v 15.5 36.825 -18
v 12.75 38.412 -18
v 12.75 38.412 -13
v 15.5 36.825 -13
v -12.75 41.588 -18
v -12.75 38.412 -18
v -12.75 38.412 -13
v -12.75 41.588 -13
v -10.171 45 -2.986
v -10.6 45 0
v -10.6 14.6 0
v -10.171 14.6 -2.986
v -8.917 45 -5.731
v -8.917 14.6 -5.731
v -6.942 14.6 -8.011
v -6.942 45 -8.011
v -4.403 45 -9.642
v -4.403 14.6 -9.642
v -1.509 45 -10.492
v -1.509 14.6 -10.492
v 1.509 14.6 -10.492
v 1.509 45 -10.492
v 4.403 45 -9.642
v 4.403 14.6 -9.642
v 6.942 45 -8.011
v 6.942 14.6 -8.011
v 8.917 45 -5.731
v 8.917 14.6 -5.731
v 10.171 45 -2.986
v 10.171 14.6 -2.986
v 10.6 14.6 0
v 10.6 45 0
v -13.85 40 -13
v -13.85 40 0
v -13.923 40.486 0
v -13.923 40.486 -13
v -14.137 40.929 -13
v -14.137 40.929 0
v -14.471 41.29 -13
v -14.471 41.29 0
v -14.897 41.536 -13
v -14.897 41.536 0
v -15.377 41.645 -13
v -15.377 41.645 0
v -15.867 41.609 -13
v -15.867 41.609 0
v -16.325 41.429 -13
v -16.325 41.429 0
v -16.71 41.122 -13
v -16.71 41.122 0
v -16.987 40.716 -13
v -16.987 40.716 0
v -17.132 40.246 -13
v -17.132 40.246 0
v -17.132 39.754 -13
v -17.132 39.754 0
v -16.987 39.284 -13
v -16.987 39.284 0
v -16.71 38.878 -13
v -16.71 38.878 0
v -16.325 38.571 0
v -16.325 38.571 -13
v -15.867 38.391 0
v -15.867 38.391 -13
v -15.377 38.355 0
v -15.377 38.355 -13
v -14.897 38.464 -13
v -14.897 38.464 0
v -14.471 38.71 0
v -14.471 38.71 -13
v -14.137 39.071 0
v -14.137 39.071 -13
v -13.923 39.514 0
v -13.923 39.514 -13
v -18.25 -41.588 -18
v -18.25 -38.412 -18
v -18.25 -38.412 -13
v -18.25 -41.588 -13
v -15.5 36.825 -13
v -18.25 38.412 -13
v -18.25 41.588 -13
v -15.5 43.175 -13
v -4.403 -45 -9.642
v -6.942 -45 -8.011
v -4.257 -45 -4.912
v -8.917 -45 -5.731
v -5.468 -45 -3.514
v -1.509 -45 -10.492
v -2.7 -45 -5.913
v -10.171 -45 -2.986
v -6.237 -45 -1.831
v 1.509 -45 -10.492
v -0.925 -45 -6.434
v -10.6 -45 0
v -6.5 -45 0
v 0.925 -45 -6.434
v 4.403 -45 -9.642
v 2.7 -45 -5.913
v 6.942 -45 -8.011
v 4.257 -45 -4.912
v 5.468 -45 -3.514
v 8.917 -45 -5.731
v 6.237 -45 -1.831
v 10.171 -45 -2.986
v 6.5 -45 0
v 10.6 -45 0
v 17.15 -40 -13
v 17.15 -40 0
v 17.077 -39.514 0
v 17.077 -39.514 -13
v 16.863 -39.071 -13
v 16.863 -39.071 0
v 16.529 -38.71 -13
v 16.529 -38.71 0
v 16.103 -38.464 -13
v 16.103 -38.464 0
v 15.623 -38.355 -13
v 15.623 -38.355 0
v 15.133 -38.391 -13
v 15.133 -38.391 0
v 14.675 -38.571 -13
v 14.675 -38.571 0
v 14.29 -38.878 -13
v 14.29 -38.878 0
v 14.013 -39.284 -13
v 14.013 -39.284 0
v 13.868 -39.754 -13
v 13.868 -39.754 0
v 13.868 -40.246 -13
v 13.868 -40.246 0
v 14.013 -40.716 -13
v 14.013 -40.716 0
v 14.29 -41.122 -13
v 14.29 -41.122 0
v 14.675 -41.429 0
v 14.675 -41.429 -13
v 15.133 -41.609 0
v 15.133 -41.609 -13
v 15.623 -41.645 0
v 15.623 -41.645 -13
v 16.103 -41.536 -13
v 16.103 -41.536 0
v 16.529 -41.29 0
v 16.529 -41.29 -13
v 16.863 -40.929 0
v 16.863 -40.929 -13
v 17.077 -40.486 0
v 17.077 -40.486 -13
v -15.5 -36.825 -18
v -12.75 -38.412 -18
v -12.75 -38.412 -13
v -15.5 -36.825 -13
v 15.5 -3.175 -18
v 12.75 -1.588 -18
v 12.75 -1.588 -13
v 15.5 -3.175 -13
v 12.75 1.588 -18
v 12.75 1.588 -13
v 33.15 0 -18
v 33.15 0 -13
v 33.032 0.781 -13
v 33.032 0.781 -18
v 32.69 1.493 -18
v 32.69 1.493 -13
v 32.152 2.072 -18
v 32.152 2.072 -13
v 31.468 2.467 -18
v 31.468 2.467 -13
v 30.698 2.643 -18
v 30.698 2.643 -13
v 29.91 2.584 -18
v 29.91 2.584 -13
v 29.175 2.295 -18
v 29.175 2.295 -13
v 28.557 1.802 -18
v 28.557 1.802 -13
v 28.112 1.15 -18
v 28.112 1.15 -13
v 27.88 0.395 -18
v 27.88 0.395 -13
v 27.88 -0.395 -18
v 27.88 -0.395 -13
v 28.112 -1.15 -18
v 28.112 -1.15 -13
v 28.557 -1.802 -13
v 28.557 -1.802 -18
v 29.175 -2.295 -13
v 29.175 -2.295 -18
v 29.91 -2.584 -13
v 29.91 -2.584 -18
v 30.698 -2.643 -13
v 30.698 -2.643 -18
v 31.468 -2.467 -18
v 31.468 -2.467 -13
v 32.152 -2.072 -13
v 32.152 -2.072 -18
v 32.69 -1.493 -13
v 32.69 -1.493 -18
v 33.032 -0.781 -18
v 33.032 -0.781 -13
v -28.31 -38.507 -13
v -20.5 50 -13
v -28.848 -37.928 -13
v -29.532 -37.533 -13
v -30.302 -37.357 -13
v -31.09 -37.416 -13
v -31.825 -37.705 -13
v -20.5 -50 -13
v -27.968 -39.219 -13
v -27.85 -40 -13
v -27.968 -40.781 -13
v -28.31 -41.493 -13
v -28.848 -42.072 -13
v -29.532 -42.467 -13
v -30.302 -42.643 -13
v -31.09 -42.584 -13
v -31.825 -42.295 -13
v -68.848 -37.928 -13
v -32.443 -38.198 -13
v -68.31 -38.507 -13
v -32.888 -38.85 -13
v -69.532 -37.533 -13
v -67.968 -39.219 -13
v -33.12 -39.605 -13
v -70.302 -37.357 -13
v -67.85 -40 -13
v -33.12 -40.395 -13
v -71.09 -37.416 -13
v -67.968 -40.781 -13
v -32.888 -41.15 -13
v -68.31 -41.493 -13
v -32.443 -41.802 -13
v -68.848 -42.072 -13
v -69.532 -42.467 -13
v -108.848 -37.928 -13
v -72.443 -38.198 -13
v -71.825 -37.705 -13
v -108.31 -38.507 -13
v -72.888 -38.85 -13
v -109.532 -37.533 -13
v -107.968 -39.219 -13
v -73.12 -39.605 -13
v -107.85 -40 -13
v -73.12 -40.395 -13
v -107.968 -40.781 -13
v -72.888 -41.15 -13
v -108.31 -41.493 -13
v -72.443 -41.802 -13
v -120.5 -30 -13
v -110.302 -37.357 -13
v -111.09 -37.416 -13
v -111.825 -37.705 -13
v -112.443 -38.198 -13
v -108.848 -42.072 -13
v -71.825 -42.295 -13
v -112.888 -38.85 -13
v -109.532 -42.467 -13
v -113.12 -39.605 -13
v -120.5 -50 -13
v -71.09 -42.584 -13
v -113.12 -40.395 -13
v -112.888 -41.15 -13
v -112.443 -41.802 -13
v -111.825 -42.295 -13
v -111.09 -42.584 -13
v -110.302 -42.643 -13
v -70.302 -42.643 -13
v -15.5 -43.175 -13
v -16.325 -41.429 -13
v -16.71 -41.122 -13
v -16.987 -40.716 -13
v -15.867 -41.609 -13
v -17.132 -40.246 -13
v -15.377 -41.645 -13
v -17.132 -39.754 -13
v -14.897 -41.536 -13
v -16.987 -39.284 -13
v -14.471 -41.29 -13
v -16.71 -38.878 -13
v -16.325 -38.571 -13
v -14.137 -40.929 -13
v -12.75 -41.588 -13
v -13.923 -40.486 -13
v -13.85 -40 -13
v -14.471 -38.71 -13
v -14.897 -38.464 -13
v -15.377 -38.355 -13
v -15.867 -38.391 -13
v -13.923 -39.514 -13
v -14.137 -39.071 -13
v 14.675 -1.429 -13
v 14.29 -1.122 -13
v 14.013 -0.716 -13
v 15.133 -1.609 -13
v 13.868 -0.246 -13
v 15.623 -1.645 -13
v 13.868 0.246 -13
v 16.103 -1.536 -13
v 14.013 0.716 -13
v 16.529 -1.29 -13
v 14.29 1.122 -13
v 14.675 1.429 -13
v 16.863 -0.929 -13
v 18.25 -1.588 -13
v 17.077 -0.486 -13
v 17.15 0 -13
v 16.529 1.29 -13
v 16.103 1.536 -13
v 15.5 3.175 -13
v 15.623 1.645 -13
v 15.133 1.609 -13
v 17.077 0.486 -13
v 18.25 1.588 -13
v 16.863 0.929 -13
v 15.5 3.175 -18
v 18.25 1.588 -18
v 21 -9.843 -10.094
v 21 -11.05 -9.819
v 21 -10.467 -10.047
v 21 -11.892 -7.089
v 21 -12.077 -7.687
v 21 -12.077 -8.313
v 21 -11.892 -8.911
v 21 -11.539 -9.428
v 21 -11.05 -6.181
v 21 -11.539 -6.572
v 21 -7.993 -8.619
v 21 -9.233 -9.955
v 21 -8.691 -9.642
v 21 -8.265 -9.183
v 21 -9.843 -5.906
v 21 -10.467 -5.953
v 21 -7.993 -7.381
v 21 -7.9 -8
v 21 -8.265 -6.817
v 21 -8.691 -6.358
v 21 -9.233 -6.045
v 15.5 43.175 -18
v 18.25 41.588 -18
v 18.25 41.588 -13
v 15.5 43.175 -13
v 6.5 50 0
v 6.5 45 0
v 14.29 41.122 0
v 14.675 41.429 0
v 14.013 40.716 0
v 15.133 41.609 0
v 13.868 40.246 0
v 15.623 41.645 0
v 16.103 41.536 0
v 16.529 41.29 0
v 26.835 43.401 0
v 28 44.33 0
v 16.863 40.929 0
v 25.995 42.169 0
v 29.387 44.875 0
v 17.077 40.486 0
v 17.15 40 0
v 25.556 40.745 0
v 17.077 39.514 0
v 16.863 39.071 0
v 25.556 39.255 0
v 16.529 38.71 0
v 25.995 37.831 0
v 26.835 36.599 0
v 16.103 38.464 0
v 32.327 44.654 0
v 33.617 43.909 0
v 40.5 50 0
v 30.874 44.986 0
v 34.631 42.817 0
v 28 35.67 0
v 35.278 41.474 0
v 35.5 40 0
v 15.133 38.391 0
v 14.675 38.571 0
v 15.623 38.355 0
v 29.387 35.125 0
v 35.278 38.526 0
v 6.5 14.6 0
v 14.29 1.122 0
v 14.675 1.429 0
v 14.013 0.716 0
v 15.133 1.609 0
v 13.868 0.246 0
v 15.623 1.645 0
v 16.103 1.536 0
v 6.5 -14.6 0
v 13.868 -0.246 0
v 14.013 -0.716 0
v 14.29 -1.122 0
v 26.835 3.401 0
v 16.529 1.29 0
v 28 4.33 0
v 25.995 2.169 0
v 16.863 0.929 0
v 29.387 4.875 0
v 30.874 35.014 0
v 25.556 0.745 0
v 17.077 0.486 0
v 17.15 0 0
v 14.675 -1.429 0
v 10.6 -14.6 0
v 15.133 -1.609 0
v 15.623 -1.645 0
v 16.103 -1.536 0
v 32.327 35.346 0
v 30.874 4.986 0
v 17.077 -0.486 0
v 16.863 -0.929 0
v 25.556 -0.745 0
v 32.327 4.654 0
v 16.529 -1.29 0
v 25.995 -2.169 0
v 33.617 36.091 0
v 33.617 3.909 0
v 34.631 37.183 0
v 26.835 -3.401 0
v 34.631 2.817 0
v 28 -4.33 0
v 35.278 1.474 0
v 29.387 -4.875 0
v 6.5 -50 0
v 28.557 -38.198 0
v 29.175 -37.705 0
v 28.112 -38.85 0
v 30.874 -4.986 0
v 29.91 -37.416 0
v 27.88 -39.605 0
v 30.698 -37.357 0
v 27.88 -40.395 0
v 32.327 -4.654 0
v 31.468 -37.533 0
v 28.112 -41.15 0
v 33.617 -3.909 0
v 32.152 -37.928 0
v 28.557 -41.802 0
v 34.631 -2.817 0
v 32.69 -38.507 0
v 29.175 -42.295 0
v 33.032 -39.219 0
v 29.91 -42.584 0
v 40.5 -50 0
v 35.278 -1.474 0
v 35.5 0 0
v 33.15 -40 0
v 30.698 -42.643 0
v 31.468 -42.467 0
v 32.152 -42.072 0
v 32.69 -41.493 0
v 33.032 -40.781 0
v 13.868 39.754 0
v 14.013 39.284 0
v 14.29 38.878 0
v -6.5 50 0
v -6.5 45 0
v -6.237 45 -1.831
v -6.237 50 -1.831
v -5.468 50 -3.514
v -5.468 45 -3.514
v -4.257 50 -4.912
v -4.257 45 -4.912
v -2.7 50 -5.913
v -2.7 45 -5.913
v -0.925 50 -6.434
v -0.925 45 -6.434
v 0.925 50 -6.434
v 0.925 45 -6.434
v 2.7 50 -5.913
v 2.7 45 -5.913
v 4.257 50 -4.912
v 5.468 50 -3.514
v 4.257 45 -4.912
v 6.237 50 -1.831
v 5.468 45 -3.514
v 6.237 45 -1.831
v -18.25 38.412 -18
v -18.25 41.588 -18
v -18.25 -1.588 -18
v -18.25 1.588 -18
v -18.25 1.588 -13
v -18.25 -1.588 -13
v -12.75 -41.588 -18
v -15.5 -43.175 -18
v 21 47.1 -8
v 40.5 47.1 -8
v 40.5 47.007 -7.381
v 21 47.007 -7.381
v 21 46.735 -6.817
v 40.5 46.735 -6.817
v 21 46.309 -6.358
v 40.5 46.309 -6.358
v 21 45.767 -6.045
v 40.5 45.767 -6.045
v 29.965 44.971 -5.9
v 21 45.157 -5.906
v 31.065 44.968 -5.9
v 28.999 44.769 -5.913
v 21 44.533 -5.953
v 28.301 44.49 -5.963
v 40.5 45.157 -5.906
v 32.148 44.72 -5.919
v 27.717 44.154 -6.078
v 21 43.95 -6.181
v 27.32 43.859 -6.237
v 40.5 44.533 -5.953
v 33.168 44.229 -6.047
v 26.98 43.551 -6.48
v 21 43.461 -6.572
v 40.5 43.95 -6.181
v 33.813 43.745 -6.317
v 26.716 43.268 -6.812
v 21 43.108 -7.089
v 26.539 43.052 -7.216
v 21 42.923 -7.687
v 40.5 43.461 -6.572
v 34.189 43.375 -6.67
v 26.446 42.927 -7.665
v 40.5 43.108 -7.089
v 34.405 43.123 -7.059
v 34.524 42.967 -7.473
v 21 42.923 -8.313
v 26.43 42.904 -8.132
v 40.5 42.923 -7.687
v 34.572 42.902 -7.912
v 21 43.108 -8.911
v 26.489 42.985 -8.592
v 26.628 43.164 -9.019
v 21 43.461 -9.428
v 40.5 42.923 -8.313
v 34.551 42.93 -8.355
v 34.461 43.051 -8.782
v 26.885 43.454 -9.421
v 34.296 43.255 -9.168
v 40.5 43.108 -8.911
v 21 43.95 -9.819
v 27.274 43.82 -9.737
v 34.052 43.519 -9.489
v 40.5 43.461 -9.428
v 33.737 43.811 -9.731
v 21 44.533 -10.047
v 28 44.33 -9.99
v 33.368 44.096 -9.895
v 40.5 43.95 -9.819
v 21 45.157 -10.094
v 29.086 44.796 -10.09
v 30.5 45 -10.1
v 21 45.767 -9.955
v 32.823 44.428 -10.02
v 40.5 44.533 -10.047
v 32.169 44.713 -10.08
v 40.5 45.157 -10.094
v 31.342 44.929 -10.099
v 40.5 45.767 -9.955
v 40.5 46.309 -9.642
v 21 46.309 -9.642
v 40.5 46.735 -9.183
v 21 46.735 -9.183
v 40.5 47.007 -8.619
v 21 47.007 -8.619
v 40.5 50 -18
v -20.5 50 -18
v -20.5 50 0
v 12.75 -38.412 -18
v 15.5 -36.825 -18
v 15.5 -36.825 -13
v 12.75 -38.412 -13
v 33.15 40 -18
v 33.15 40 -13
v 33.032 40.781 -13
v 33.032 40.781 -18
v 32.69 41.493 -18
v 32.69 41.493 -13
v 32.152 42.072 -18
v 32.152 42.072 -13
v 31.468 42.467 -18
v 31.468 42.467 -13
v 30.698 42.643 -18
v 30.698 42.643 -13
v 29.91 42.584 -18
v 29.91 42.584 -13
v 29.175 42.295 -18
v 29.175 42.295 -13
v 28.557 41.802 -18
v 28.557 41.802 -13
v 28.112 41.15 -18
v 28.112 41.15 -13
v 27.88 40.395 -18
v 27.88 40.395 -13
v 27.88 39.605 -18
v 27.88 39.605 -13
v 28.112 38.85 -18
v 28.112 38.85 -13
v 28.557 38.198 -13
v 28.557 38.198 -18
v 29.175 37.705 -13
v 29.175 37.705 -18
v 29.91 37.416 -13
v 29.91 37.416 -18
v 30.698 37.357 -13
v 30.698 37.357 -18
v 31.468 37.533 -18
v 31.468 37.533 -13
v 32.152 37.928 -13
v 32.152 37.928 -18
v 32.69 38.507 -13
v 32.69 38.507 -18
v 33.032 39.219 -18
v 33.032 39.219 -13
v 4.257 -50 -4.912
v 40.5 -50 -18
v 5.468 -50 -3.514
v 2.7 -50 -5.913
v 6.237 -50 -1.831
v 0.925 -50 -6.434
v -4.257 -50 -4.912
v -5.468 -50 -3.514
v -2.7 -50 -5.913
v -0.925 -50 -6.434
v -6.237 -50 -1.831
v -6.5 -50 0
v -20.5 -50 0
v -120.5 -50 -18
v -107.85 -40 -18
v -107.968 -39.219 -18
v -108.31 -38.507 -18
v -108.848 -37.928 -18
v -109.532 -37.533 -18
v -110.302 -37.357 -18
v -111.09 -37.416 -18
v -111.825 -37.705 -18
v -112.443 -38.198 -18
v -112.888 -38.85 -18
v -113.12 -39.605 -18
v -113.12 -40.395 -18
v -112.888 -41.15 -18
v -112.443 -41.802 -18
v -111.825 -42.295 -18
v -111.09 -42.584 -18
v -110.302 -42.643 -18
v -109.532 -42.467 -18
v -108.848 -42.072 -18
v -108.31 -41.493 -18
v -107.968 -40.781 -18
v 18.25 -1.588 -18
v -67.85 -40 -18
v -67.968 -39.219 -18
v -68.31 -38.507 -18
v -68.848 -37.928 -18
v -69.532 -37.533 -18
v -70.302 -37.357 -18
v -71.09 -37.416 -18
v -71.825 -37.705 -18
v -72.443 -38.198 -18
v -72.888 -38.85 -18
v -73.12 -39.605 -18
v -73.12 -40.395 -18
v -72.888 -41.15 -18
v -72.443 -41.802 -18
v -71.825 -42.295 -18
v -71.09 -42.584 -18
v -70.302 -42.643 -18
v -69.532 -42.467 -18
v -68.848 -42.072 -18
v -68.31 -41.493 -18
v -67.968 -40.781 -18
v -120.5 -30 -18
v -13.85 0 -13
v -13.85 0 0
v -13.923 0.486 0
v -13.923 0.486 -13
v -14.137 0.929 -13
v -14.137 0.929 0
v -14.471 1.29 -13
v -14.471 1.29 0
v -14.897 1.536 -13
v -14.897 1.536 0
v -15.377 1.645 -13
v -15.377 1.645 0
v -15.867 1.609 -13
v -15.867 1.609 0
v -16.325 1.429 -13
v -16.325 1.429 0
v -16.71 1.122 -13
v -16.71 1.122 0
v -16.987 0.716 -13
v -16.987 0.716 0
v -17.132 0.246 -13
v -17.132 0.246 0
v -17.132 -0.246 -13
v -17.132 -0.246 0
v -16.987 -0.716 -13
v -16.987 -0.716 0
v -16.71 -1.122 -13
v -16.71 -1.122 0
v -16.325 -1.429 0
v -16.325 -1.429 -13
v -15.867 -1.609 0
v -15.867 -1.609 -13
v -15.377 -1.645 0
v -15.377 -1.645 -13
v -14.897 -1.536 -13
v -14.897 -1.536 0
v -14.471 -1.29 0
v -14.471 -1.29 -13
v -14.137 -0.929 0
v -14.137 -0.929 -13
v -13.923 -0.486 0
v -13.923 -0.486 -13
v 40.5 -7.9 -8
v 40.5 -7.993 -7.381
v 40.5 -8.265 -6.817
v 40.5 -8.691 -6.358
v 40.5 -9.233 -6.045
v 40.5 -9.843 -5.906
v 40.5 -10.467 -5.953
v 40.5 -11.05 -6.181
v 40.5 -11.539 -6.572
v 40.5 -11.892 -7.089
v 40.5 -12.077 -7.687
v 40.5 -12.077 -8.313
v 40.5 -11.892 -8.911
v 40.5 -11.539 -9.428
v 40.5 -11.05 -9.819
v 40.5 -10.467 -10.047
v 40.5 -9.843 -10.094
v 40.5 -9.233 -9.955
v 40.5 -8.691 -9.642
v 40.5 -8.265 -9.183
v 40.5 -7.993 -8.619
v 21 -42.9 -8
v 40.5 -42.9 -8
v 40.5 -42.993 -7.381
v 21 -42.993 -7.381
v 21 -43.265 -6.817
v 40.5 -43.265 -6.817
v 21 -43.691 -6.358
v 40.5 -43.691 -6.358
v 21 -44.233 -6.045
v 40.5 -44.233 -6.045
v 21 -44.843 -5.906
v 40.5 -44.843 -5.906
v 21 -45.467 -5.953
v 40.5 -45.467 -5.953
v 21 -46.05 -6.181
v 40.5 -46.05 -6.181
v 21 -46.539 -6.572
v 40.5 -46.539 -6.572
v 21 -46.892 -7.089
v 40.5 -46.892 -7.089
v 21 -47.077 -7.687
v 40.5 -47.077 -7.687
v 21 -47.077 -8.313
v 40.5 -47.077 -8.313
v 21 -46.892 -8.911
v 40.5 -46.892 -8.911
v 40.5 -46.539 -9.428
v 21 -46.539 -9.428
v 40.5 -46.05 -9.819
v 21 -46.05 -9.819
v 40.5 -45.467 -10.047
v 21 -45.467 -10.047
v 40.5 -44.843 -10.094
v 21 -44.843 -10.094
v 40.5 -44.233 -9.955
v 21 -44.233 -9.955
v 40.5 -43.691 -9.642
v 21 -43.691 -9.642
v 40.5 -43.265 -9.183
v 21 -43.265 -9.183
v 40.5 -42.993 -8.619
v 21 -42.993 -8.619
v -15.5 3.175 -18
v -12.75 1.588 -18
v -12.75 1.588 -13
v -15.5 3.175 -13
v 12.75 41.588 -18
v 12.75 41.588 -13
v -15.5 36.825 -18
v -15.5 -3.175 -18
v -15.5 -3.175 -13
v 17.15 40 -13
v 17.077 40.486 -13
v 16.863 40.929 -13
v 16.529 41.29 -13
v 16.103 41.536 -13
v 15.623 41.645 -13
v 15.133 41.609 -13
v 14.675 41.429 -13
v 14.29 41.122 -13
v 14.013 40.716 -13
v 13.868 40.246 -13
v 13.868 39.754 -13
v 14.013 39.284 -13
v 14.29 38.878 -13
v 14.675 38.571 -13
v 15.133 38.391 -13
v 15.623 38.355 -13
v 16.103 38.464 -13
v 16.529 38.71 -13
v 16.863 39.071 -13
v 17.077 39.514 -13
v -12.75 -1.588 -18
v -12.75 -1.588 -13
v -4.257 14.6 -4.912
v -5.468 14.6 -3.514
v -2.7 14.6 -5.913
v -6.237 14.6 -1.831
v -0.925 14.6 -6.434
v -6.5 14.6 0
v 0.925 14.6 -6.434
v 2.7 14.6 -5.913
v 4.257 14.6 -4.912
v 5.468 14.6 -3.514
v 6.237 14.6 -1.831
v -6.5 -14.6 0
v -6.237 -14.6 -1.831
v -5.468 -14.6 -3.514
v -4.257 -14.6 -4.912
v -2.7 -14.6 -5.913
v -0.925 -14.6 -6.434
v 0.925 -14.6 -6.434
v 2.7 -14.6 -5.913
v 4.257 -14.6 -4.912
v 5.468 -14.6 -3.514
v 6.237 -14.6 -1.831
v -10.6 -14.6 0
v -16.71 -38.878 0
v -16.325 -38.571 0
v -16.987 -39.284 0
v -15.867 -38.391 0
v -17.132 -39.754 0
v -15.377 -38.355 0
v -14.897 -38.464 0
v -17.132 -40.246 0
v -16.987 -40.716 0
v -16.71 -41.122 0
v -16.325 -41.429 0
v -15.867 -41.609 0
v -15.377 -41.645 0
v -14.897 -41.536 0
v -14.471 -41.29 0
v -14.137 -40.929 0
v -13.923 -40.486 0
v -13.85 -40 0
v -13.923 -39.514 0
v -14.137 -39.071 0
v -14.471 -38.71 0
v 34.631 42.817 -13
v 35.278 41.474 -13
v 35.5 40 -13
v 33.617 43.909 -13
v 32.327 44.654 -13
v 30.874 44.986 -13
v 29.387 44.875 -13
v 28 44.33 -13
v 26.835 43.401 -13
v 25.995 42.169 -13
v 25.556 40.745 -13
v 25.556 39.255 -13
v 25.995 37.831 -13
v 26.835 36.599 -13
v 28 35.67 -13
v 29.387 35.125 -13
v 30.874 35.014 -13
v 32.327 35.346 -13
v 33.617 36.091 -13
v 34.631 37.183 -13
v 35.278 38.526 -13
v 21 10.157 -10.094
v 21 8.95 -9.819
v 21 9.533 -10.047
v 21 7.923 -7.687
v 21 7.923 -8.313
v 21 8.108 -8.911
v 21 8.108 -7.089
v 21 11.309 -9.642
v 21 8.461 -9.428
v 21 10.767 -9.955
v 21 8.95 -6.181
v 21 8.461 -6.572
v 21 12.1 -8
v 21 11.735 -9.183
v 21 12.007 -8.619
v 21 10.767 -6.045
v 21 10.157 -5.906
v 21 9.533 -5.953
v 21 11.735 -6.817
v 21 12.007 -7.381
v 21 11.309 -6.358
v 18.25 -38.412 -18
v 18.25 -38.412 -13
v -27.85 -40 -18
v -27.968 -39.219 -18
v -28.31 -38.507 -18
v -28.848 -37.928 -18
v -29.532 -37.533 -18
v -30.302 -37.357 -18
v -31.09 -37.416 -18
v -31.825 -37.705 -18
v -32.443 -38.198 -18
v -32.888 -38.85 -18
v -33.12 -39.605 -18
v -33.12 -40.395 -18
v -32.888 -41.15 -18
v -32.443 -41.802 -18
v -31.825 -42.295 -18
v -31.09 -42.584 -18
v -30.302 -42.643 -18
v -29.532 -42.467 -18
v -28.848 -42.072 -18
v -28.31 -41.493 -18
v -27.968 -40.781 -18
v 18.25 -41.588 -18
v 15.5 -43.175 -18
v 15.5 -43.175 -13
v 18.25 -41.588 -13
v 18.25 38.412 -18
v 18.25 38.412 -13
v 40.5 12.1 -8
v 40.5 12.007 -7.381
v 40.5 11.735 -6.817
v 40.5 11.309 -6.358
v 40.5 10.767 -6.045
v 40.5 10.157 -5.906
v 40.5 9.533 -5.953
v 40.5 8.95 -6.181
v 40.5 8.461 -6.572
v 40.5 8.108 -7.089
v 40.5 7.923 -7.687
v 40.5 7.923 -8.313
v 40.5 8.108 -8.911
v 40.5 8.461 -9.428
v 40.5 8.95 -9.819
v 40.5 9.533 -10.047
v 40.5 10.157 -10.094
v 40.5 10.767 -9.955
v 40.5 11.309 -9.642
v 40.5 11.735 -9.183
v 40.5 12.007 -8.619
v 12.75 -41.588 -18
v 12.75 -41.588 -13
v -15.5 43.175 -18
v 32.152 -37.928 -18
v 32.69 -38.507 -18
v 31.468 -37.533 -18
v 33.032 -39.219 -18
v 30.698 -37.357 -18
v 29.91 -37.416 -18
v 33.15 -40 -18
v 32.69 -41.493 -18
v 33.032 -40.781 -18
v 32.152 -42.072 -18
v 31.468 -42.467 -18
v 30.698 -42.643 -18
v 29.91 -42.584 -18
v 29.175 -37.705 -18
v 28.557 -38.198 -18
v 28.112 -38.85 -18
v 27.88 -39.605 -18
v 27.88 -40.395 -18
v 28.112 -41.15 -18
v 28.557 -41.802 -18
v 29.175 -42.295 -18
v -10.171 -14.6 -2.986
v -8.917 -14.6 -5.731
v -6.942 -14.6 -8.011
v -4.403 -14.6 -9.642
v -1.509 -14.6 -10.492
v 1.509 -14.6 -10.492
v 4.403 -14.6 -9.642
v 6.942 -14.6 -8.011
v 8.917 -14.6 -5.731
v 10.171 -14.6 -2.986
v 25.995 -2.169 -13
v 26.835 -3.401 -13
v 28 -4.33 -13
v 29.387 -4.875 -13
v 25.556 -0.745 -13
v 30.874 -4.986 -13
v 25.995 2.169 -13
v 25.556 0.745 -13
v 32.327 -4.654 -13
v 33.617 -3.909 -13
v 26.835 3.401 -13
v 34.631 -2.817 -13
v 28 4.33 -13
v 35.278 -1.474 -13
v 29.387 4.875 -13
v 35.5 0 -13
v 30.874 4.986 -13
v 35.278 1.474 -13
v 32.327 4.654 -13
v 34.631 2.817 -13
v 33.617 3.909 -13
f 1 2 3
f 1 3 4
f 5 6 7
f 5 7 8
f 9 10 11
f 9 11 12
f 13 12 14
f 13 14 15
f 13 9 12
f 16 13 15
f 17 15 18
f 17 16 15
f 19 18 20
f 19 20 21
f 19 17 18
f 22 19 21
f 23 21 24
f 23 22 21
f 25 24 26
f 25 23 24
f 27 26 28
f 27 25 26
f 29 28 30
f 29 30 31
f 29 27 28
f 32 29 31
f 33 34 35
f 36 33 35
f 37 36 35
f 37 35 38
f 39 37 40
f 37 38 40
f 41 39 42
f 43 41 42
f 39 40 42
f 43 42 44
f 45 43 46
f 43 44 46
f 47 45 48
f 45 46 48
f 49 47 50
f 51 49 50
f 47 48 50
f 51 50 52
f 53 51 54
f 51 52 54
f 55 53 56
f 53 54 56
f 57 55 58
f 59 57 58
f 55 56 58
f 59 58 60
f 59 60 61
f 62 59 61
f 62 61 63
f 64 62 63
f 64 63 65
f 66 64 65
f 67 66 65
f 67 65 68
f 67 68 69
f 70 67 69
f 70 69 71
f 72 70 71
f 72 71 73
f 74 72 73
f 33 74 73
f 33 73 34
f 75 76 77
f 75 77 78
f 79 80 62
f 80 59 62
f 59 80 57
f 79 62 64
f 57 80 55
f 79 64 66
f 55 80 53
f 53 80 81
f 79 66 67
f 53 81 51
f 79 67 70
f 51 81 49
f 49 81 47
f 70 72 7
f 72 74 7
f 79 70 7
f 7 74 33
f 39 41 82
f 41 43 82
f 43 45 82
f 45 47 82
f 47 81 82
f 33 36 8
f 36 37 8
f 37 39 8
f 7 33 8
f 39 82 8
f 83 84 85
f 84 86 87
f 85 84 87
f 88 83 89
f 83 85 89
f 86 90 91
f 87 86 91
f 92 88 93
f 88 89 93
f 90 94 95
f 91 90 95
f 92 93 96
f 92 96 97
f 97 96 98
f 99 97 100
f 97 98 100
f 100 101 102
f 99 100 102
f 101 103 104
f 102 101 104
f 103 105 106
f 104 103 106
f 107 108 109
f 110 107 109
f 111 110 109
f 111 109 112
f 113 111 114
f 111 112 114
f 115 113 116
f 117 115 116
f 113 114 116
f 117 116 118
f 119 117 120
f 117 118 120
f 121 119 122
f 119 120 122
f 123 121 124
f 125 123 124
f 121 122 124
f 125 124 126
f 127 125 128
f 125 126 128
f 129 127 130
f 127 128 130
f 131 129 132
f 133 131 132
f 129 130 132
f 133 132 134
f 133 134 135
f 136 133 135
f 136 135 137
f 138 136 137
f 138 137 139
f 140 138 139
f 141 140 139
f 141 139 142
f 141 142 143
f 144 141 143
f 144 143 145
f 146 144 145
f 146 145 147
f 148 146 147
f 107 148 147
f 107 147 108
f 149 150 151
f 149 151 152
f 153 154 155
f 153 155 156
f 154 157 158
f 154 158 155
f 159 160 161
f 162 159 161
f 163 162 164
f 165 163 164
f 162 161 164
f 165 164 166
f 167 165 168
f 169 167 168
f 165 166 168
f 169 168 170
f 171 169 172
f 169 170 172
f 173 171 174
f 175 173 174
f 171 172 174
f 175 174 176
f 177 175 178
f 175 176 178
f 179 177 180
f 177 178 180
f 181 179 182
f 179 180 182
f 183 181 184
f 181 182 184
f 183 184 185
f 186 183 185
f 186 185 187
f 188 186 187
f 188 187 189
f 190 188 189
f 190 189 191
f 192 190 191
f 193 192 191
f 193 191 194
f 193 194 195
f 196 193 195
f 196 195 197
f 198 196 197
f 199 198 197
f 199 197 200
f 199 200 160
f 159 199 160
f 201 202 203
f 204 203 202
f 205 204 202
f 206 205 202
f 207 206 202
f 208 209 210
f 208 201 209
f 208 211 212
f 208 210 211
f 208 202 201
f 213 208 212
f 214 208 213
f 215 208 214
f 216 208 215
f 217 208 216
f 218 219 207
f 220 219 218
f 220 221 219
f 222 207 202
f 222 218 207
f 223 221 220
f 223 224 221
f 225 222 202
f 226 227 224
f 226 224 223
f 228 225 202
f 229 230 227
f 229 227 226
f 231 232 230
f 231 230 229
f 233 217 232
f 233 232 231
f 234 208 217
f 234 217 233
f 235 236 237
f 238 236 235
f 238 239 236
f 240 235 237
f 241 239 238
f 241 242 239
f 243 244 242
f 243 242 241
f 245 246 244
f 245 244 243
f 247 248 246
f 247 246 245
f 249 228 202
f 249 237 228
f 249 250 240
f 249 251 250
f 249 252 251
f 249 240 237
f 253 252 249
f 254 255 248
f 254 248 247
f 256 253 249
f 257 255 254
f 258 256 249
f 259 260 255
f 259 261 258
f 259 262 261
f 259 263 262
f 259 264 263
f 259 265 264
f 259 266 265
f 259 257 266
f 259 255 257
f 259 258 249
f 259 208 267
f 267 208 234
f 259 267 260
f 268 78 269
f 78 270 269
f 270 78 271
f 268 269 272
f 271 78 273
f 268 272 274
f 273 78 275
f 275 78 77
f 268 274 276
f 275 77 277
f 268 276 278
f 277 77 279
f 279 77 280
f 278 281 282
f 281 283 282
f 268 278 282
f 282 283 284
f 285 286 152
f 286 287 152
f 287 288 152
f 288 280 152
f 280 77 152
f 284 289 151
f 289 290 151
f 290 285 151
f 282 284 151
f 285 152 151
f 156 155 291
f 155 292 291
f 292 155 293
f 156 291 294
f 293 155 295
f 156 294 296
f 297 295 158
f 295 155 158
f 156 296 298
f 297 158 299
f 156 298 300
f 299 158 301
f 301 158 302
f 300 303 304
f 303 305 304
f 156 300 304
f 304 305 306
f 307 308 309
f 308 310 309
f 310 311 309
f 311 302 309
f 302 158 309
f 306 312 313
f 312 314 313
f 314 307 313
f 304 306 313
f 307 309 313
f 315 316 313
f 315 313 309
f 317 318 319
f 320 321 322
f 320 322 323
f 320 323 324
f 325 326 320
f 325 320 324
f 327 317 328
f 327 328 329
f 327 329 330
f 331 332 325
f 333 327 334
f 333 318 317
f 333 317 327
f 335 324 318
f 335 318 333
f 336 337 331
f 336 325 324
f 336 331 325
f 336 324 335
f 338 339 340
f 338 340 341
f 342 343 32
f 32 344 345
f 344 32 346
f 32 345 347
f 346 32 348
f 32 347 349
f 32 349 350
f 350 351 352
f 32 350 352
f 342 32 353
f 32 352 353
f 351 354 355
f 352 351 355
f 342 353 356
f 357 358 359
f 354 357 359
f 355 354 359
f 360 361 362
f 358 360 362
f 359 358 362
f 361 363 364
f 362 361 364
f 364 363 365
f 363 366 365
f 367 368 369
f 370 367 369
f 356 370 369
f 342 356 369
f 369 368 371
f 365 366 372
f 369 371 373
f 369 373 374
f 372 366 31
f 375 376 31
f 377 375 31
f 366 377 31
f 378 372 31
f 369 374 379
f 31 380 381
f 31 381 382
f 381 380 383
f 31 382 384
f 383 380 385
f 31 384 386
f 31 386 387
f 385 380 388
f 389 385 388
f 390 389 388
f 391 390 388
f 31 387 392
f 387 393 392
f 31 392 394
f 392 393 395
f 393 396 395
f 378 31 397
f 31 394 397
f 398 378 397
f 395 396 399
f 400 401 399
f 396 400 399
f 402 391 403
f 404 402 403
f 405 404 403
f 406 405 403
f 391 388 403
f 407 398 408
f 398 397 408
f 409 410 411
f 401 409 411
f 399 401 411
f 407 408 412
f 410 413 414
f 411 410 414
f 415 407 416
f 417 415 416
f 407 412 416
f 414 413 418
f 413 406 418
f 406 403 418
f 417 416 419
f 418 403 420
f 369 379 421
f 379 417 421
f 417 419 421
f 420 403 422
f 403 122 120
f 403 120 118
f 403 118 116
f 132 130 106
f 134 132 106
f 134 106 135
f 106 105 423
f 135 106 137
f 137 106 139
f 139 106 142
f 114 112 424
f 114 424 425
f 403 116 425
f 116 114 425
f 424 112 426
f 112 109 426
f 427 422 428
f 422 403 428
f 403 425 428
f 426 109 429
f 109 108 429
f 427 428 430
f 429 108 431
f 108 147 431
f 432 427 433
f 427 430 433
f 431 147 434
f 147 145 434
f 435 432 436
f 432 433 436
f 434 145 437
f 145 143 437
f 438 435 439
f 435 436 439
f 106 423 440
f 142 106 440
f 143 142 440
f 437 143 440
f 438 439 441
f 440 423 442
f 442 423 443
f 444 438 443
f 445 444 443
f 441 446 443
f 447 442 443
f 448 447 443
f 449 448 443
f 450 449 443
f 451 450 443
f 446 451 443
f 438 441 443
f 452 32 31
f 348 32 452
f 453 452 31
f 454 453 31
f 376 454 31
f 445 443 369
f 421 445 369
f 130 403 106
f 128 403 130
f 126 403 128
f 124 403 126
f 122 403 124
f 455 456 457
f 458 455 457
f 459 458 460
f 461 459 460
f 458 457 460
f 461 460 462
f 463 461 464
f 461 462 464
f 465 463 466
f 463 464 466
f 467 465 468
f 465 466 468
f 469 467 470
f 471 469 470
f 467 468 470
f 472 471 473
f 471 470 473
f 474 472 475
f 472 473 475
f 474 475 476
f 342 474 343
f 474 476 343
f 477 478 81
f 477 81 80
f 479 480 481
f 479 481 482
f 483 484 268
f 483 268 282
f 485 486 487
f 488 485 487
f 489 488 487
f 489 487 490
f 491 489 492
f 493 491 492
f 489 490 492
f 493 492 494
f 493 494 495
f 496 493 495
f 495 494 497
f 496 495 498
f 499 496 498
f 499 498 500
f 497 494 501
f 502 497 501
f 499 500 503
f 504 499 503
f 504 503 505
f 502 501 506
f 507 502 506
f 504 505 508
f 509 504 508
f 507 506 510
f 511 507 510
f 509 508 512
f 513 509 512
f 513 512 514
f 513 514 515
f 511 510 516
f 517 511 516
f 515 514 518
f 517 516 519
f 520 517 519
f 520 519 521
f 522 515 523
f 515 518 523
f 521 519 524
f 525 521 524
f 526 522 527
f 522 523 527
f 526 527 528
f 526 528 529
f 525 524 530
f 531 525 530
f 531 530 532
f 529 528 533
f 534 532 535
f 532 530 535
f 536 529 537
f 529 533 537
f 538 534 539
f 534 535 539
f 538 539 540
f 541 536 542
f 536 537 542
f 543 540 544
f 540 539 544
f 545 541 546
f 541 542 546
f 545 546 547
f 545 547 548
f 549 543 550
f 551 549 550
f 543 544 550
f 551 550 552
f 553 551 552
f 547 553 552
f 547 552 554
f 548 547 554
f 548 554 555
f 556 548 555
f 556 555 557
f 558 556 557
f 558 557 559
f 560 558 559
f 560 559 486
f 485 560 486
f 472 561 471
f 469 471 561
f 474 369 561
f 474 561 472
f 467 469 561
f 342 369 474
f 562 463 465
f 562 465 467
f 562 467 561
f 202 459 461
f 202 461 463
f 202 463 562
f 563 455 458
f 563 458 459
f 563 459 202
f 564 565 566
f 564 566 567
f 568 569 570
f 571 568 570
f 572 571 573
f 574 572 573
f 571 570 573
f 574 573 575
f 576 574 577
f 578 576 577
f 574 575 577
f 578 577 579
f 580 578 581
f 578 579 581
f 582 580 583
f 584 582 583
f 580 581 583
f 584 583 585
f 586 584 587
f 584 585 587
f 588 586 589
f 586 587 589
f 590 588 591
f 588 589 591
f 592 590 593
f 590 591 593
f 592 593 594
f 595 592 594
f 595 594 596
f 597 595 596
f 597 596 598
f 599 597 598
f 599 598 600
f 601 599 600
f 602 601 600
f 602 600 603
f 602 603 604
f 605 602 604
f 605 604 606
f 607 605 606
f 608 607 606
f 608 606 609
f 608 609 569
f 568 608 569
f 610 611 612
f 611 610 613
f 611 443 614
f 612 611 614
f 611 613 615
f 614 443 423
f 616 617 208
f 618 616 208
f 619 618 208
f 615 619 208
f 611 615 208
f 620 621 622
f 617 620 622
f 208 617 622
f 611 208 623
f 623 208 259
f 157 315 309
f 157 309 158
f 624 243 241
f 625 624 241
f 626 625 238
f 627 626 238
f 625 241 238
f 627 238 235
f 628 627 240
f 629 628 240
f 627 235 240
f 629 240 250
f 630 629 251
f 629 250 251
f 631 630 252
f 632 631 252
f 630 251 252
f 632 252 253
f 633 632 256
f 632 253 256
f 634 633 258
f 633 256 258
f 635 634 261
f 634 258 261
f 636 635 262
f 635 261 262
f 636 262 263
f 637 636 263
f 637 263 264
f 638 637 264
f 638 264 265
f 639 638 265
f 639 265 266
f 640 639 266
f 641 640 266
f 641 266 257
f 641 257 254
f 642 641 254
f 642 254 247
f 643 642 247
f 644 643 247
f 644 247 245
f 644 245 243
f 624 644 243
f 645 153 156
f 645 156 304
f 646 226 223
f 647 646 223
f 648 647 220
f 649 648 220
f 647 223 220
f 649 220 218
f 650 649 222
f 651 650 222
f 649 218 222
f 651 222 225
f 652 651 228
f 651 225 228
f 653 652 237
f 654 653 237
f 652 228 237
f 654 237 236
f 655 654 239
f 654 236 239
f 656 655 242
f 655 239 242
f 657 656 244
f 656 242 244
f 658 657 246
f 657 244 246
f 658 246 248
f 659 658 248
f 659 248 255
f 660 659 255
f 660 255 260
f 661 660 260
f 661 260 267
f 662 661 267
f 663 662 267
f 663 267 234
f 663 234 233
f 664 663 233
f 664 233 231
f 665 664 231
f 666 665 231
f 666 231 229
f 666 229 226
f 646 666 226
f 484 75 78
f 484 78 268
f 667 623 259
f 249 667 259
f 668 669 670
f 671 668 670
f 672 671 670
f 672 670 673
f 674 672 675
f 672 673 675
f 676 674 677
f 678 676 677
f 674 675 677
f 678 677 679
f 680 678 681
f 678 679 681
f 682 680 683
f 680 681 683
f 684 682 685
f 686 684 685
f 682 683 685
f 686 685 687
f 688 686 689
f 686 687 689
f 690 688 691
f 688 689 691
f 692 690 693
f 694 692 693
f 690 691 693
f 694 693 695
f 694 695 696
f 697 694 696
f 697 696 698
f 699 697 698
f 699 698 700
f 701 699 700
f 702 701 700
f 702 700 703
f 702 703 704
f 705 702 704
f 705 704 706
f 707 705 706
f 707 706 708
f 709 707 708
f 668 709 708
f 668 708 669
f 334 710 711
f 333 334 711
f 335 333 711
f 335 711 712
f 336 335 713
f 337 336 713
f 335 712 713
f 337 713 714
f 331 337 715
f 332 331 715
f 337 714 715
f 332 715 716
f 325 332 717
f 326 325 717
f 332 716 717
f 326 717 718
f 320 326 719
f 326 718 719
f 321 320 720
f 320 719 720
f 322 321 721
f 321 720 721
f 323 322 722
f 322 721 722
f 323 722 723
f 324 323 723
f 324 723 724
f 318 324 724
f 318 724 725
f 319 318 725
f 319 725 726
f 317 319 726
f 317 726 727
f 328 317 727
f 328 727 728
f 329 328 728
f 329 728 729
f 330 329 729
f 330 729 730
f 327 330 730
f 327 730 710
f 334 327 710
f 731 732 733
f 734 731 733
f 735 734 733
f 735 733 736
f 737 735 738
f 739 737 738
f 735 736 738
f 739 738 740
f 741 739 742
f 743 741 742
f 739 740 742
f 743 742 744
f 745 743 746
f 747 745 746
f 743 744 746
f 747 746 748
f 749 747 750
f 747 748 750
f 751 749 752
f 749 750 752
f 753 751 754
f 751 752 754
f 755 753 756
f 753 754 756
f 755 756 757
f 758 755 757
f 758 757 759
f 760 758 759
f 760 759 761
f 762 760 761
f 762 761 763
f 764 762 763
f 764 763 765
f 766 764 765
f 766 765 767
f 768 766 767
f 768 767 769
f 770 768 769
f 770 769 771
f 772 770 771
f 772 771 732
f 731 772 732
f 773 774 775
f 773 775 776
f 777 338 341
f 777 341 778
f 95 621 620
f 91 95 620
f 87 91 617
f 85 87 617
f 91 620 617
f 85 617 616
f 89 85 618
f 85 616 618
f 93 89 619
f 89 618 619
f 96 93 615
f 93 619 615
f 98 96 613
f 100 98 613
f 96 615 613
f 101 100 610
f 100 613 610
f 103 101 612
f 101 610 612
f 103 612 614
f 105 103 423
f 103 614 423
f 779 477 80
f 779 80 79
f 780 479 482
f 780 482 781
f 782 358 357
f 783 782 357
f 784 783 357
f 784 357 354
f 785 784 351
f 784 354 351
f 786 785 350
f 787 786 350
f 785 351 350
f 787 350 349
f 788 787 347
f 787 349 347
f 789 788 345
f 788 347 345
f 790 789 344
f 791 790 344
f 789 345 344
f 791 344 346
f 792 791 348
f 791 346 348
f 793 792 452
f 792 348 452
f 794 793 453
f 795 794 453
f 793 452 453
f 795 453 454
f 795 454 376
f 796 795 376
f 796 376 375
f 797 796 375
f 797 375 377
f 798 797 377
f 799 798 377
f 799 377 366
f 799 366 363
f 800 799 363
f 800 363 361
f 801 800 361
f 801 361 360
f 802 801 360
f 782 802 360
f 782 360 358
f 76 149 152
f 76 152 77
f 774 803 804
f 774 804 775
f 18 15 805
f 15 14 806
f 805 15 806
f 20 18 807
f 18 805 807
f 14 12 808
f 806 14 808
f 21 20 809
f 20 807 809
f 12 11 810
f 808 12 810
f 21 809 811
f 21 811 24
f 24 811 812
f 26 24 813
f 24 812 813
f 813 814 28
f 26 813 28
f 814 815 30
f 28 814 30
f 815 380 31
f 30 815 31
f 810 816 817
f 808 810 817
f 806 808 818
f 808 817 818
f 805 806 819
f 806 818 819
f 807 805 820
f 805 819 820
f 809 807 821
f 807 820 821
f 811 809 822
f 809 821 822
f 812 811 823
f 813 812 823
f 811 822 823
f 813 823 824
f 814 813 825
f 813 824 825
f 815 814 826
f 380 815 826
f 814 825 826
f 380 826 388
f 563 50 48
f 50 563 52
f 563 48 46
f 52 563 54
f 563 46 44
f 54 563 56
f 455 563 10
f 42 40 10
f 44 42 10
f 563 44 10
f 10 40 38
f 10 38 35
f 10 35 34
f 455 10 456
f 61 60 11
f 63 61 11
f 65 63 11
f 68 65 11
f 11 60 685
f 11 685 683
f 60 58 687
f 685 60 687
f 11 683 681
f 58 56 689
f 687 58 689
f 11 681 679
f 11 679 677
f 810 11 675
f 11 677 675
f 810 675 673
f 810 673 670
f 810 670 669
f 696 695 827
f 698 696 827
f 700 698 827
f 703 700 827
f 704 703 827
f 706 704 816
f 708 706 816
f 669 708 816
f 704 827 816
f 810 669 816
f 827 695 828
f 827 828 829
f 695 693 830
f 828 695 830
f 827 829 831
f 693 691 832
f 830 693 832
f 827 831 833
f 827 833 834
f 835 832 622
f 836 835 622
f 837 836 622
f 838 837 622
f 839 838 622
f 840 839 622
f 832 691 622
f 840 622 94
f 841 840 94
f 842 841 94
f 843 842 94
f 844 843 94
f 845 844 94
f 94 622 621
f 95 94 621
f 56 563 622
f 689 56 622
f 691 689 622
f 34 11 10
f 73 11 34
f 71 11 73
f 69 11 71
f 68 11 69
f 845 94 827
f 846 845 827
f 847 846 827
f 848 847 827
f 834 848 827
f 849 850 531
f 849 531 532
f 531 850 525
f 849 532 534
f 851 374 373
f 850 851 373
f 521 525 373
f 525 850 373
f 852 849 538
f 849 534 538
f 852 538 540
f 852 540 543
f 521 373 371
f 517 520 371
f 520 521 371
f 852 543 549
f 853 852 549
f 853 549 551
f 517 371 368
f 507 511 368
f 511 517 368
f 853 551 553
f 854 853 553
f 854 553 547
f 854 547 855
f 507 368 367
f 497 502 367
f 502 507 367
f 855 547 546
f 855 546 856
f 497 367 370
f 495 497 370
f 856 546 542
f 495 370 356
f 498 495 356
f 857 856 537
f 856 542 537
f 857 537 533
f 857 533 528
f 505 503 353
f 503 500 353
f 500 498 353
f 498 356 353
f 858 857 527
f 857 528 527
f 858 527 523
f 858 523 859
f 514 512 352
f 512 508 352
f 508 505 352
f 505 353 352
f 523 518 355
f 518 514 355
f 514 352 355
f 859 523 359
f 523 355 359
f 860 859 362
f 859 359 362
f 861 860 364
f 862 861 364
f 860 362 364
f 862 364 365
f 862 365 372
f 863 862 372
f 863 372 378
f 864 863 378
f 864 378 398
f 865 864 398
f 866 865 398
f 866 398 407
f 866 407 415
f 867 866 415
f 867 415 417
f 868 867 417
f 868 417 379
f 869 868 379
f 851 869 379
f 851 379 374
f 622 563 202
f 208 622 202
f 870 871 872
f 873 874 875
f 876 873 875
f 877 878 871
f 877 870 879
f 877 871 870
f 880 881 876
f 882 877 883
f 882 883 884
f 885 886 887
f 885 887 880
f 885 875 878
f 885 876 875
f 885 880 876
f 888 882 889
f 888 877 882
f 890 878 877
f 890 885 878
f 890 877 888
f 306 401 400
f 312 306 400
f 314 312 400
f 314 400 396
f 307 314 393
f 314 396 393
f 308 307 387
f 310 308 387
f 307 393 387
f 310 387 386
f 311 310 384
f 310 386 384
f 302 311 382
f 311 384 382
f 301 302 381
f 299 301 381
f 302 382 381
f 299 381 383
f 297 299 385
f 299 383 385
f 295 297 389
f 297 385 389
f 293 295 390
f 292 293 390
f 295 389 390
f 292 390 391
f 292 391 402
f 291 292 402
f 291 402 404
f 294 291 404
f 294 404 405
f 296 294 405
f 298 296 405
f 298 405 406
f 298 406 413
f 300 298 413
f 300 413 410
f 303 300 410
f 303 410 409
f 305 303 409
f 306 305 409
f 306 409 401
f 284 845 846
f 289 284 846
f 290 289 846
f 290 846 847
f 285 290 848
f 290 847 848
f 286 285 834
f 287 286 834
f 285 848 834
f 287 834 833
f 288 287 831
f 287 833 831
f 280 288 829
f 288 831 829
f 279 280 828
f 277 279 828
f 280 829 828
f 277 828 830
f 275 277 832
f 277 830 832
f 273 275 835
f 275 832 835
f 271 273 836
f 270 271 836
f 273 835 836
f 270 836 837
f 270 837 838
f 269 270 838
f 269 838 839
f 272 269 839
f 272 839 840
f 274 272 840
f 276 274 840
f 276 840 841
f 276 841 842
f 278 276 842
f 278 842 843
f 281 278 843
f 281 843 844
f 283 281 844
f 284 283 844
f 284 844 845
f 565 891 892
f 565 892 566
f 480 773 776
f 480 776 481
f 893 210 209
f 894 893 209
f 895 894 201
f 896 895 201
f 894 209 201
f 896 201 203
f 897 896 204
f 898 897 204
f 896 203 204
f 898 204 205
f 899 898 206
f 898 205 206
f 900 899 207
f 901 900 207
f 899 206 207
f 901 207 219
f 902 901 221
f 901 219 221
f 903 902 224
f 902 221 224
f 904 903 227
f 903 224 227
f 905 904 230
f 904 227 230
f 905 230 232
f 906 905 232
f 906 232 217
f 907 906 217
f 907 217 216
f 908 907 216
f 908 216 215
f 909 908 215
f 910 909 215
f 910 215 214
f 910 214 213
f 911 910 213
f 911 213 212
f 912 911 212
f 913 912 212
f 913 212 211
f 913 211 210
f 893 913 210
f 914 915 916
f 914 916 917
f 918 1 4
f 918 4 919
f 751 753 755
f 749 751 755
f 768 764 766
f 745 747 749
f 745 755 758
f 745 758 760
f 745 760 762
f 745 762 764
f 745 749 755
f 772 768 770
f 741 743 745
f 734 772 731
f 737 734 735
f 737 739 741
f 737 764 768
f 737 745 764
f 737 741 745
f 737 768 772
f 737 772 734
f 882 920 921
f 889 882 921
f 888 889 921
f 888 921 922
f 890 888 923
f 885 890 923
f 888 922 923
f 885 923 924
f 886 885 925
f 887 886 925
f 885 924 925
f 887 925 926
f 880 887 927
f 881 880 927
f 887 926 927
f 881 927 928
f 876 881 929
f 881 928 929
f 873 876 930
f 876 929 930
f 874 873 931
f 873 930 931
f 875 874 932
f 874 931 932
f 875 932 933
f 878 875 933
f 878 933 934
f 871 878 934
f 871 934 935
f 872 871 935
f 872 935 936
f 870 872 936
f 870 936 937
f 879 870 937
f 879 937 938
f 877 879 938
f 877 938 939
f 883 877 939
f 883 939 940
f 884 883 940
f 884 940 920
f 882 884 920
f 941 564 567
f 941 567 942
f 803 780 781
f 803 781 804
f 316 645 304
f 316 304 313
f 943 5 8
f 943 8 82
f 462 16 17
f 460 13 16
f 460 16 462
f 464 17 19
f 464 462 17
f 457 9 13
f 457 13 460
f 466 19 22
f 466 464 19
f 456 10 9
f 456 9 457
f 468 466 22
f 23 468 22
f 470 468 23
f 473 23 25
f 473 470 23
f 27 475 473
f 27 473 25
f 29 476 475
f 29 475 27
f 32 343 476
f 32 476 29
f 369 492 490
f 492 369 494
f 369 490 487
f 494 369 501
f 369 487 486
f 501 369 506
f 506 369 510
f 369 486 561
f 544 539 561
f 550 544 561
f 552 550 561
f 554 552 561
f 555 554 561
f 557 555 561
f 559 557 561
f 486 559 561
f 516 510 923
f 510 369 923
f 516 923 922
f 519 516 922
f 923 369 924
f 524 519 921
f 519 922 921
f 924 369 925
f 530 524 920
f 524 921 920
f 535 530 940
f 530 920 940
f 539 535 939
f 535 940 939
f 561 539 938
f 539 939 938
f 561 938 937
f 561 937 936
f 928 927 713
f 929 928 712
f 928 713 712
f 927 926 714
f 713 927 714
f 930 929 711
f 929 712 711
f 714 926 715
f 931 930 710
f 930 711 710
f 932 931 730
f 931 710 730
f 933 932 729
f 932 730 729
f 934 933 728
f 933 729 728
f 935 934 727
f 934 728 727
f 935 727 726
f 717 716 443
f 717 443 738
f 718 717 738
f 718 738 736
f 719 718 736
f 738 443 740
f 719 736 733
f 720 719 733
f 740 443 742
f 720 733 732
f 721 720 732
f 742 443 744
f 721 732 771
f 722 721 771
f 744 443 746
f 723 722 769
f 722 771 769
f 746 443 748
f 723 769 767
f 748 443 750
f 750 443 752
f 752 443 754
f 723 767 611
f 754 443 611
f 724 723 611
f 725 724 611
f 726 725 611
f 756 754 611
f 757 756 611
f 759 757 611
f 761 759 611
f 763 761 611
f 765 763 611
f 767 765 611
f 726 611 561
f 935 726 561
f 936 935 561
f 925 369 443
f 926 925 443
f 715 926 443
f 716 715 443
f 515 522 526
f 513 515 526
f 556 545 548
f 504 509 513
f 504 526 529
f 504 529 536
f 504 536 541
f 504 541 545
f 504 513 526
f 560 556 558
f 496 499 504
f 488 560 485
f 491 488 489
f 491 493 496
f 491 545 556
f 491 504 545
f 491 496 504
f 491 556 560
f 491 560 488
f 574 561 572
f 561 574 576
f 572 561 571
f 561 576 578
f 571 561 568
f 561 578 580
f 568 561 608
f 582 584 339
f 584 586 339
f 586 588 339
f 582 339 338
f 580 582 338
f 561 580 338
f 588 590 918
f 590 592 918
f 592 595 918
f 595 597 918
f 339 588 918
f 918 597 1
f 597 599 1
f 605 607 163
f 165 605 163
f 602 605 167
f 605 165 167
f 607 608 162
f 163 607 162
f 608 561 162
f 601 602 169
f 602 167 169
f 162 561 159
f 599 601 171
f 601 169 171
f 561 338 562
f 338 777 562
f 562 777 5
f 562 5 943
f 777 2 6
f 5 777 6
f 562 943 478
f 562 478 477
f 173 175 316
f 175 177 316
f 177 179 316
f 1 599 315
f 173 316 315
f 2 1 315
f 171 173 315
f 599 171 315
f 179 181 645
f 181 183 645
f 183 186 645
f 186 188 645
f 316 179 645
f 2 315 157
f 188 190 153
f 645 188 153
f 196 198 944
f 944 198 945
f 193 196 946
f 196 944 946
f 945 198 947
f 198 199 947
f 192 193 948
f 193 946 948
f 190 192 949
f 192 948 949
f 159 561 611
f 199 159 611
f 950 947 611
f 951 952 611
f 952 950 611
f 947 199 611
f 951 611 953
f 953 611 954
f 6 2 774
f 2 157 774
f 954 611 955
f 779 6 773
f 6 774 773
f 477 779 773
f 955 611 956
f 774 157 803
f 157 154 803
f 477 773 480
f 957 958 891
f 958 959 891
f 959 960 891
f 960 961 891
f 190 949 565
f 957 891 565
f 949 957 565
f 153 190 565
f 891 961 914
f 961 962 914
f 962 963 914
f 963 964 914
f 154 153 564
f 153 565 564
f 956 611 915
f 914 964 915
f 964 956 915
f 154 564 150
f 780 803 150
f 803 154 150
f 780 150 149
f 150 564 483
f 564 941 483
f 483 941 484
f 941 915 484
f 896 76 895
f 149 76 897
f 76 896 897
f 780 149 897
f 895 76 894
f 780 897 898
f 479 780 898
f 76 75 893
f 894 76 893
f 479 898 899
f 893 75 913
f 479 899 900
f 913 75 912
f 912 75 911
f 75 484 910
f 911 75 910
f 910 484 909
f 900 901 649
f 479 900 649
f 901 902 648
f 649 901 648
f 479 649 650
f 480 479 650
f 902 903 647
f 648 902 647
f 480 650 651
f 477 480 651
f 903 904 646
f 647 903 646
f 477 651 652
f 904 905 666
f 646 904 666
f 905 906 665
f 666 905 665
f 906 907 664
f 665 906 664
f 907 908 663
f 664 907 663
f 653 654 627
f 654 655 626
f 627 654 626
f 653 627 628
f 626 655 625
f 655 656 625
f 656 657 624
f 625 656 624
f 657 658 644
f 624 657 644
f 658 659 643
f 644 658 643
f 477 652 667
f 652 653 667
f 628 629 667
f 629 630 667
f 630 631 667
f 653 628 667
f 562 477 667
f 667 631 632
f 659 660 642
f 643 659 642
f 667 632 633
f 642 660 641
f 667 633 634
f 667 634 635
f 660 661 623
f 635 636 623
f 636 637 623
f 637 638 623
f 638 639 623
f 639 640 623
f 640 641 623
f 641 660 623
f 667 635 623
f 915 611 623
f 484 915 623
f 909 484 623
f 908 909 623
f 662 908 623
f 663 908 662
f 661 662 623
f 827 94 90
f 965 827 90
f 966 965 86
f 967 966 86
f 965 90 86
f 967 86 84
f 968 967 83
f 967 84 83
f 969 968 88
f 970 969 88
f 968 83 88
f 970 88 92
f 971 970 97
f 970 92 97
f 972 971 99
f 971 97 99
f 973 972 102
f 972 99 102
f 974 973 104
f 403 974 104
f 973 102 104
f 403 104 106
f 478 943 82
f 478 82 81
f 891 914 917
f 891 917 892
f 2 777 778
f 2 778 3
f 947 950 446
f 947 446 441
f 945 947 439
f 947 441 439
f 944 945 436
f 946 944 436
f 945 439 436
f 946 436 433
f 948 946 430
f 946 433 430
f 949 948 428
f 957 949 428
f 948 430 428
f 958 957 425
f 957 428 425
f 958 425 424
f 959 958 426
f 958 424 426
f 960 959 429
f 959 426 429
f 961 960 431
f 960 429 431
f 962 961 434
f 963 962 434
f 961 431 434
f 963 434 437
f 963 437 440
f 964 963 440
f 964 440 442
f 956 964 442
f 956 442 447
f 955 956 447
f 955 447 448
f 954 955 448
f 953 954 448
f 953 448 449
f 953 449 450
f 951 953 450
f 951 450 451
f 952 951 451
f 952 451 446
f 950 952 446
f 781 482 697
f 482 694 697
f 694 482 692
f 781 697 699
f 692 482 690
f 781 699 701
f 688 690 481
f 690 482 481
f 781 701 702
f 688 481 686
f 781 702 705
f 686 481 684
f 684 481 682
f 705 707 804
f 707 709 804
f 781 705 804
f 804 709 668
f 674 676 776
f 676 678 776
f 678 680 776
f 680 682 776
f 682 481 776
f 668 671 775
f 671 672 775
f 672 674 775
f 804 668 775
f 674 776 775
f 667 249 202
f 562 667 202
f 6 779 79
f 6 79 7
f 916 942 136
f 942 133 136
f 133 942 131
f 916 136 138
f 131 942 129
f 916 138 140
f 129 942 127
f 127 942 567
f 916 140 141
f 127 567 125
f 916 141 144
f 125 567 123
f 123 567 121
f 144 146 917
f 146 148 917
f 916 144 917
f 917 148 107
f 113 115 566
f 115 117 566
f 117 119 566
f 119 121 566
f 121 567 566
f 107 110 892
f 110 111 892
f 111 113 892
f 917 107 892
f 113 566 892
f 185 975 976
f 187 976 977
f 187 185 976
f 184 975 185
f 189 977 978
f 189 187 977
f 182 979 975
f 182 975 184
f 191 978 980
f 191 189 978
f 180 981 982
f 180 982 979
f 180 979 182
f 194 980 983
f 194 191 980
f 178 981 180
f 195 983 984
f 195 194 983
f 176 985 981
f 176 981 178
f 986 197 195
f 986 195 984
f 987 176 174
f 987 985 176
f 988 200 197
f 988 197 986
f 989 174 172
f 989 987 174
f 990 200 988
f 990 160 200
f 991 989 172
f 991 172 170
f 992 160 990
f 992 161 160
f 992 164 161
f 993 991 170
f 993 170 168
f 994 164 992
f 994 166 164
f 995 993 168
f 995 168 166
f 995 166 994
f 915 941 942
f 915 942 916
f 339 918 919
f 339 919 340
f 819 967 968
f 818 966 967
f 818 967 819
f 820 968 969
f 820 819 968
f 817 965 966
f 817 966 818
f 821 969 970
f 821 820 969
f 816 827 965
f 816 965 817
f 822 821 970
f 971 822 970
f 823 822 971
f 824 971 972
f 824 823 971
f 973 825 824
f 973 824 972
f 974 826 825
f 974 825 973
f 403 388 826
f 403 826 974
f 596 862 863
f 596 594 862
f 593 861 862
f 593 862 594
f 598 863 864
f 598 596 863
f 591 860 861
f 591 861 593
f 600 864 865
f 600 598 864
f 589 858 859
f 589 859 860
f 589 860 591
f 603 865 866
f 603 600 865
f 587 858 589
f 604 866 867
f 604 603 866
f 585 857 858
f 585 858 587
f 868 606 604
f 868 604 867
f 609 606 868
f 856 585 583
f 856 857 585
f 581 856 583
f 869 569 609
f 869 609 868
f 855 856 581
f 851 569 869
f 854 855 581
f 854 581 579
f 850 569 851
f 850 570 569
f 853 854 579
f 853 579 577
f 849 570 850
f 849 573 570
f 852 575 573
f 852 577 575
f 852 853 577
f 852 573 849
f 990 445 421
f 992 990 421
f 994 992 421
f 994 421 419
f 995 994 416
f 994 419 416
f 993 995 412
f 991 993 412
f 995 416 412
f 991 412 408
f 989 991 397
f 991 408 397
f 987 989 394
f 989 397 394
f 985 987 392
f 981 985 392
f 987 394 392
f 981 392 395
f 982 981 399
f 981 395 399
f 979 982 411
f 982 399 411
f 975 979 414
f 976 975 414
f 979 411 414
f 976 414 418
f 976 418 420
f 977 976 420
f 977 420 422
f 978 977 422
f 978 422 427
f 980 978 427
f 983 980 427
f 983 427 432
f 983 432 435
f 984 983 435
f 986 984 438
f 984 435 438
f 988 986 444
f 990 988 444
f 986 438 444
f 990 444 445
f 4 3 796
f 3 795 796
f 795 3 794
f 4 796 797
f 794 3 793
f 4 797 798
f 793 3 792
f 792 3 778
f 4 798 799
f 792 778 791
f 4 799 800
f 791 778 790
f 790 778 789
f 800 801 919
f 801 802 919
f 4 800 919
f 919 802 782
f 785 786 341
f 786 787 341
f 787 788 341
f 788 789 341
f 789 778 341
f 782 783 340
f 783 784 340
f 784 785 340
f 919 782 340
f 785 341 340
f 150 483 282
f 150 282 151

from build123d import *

# Parameters (mm, degrees)
PAD_DEPTH       = 50
POCKET_DEPTH    = 18.001
SKETCH003_R     = 10.6
POCKET001_DEPTH = 30.4
SKETCH004_R     = 10.6
POCKET002_DEPTH = 30.4
SKETCH005_R     = 1.65
SKETCH005_R_2   = 2.65
POCKET007_DEPTH = 18.001
POCKET008_DEPTH = 5
SKETCH006_R     = 2.65
POCKET009_DEPTH = 18.001
SKETCH007_R     = 5
POCKET010_DEPTH = 13
SKETCH008_R     = 2.1
POCKET011_DEPTH = 20


with BuildPart() as part:
    # Sketch001 → Pad (new body, symmetric)
    with BuildSketch(Plane.XZ):
        with BuildLine():
            Line((-20.5, 0), (-6.5, 0))
            ThreePointArc((-6.5, 0), (0, -6.5), (6.5, 0))
            Line((6.5, 0), (20.5, 0))
            Line((20.5, 0), (40.5, 0))
            Line((40.5, 0), (40.5, -18))
            Line((40.5, -18), (20.5, -18))
            Line((20.5, -18), (-120.5, -18))
            Line((-120.5, -18), (-120.5, -13))
            Line((-20.5, -13), (-120.5, -13))
            Line((-20.5, 0), (-20.5, -13))
        make_face()
    extrude(amount=PAD_DEPTH, both=True)

    # Sketch002 → Pocket (cut, through all)
    with BuildSketch(Plane.XY):
        Polygon((-20.5, 50), (-120.5, 50), (-120.5, -30), align=None)
    extrude(amount=-POCKET_DEPTH, mode=Mode.SUBTRACT)

    # Sketch003 (on DatumPlane) → Pocket001 (cut)
    with BuildSketch(Plane.XZ.offset(45)):
        Circle(SKETCH003_R)
    extrude(amount=-POCKET001_DEPTH, mode=Mode.SUBTRACT)

    # Sketch004 (on DatumPlane) → Pocket002 (cut)
    with BuildSketch(Plane.XZ.offset(-45)):
        Circle(SKETCH004_R)
    extrude(amount=POCKET002_DEPTH, mode=Mode.SUBTRACT)

    # Sketch005 → Pocket007 (cut, through all)
    with BuildSketch(Plane.XY):
        with Locations((-15.5, -40)):
            Circle(SKETCH005_R)
        with Locations((15.5, -40)):
            Circle(SKETCH005_R)
        with Locations((15.5, 0)):
            Circle(SKETCH005_R)
        with Locations((15.5, 40)):
            Circle(SKETCH005_R)
        with Locations((-15.5, 40)):
            Circle(SKETCH005_R)
        with Locations((-15.5, 0)):
            Circle(SKETCH005_R)
        with Locations((-110.5, -40)):
            Circle(SKETCH005_R_2)
        with Locations((-70.5, -40)):
            Circle(SKETCH005_R_2)
        with Locations((-30.5, -40)):
            Circle(SKETCH005_R_2)
    extrude(amount=-POCKET007_DEPTH, mode=Mode.SUBTRACT)

    # Sketch (on DatumPlane) → Pocket008 (cut)
    with BuildSketch(Plane.XY.offset(-18)):
        Polygon((-12.75, 38.412287), (-12.75, 41.587713), (-15.5, 43.175426), (-18.25, 41.587713), (-18.25, 38.412287), (-15.5, 36.824574), align=None)
        Polygon((18.25, 38.412287), (18.25, 41.587713), (15.5, 43.175426), (12.75, 41.587713), (12.75, 38.412287), (15.5, 36.824574), align=None)
        Polygon((-12.75, -1.587713), (-12.75, 1.587713), (-15.5, 3.175426), (-18.25, 1.587713), (-18.25, -1.587713), (-15.5, -3.175426), align=None)
        Polygon((18.25, -1.587713), (18.25, 1.587713), (15.5, 3.175426), (12.75, 1.587713), (12.75, -1.587713), (15.5, -3.175426), align=None)
        Polygon((-12.75, -41.587713), (-12.75, -38.412287), (-15.5, -36.824574), (-18.25, -38.412287), (-18.25, -41.587713), (-15.5, -43.175426), align=None)
        Polygon((18.25, -41.587713), (18.25, -38.412287), (15.5, -36.824574), (12.75, -38.412287), (12.75, -41.587713), (15.5, -43.175426), align=None)
    extrude(amount=POCKET008_DEPTH, mode=Mode.SUBTRACT)

    # Sketch006 → Pocket009 (cut, through all)
    with BuildSketch(Plane.XY):
        with Locations((30.5, 40)):
            Circle(SKETCH006_R)
        with Locations((30.5, 0)):
            Circle(SKETCH006_R)
        with Locations((30.5, -40)):
            Circle(SKETCH006_R)
    extrude(amount=-POCKET009_DEPTH, mode=Mode.SUBTRACT)

    # Sketch007 → Pocket010 (cut)
    with BuildSketch(Plane.XY):
        with Locations((30.5, 40)):
            Circle(SKETCH007_R)
        with Locations((30.5, 0)):
            Circle(SKETCH007_R)
    extrude(amount=-POCKET010_DEPTH, mode=Mode.SUBTRACT)

    # Sketch008 (on DatumPlane) → Pocket011 (cut)
    with BuildSketch(Plane.YZ.offset(41)):
        with Locations((-45, -8)):
            Circle(SKETCH008_R)
        with Locations((-10, -8)):
            Circle(SKETCH008_R)
        with Locations((10, -8)):
            Circle(SKETCH008_R)
        with Locations((45, -8)):
            Circle(SKETCH008_R)
    extrude(amount=-POCKET011_DEPTH, mode=Mode.SUBTRACT)


solid = part.part
